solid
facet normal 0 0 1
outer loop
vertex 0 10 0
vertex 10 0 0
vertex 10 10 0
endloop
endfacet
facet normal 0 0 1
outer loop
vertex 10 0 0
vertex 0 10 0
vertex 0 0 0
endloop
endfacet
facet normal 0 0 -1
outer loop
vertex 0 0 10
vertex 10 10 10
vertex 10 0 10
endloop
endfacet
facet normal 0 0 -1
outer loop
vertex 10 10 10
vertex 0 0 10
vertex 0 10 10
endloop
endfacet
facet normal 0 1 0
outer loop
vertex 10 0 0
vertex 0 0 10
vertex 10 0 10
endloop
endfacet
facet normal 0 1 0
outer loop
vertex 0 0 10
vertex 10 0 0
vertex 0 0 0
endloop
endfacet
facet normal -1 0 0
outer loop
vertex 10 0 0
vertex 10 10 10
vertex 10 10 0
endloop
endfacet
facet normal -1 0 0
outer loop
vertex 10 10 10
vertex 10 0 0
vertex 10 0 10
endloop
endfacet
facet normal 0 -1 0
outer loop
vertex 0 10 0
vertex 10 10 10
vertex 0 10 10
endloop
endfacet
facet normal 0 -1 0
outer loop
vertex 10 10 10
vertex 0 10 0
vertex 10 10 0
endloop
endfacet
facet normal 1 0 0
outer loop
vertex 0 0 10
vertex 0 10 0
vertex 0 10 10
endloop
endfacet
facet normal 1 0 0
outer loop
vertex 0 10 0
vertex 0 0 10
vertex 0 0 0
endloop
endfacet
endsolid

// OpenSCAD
// Same cube, but with intentionally mixed winding
// OpenSCAD accepts this, OCC does not unless you fix orientation

polyhedron(
    points = [
        [0, 0, 0],
        [10, 0, 0],
        [10, 10, 0],
        [0, 10, 0],
        [0, 0, 10],
        [10, 0, 10],
        [10, 10, 10],
        [0, 10, 10]
    ],
    faces = [
        [0, 3, 2, 1],   // reversed
        [4, 5, 6, 7],
        [0, 1, 5, 4],
        [1, 2, 6, 5],
        [2, 3, 7, 6],
        [3, 0, 4, 7]
    ]
);
